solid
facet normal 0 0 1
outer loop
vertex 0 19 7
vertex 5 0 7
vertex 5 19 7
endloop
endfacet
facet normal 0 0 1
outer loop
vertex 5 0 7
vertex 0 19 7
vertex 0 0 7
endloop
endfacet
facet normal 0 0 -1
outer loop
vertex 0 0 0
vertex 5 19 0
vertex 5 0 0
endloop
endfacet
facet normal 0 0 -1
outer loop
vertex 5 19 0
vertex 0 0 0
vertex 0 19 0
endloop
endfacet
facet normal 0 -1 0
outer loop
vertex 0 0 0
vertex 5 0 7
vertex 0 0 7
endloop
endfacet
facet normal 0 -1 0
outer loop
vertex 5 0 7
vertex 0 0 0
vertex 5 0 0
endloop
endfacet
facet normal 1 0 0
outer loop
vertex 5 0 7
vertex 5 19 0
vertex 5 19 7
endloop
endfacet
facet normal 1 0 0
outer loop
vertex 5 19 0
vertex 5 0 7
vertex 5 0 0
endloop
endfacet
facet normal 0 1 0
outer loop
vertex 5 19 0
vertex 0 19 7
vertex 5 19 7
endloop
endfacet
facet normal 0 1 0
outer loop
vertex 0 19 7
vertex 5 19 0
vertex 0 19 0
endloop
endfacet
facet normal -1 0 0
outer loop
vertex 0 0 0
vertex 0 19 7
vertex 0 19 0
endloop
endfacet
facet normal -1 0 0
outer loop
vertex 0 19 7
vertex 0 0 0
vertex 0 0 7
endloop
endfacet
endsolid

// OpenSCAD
// Generated by SolidPython 1.0.1 on 2020-07-29 00:46:54


cube(size = [5, 19, 7]);
/***********************************************
*********      SolidPython code:      **********
************************************************
 
# import packages: SolidPython
from solid import *
from solid.utils import *
from itertools import chain, combinations, permutations


class Resize:

    def __init__(self, scad_file):
        self.scad_file = scad_file
        #self.scad_file = import_scad(scad_file)
        # cone/cylinder param:
        self.r1 = 0
        self.r2 = 0
        self.h = 0
        # rectangular prism param:
        self.w = 0
        self.l = 0
        # ellipse param:
        self.r = 0

    # import OpenScad code (file name corresponds to shape)


    # classify shape + parameters
    def assign(self, param1, param2, param3):
        if self.scad_file == 'cone.scad':
            self.r1 = param1
            self.r2 = param2
            self.h = param3
        elif self.scad_file == 'cylinder.scad':
            self.r1 = param1
            self.r2 = param2
            self.h = param3
        elif self.scad_file == 'rectangularPrism.scad':
            self.h = param1
            self.l = param2
            self.w = param3
        else:
            self.r = param1
            self.h = param2

    # resize parameters
    def iterate(self):
        x = range(3, 20, 2)
        i = 1
        if self.scad_file == 'cone.scad':
            tempList = list(permutations(x, 2))
            for temp in tempList:
                param1 = temp[0]
                param2 = temp[1]
                filepath = 'produced_scad_files/' + 'cone' + str(param1) + '_' + str(param2) + '_' + '.scad'
                scad_render_to_file(cylinder(h=param1, r1=param2, r2=0), filepath)

        elif self.scad_file == 'cylinder.scad':
            tempList = list(permutations(x, 3))
            for temp in tempList:
                param1 = temp[0]
                param2 = temp[1]
                filepath = 'produced_scad_files/' + 'cylinder' + str(param1) + '_' + str(param2) + '_' + '.scad'
                scad_render_to_file(cylinder(h=param1, r1=param2, r2=param2), filepath)

        elif self.scad_file == 'rectangularPrism.scad':
            tempList = list(permutations(x, 3))
            for temp in tempList:
                param1 = temp[0]
                param2 = temp[1]
                param3 = temp[2]
                filepath = 'produced_scad_files/' + 'rectangularPrism' + str(param1) + '_' + str(param2) + '_' + str(
                    param3) + '.scad'
                scad_render_to_file(cube(size=(param1, param2, param3)), filepath)

        elif self.scad_file == 'ellipse.scad':
            tempList = list(permutations(x, 4))
            for temp in tempList:
                param1 = temp[0]
                param2 = temp[1]
                param3 = temp[2]
                param4 = temp[3]
                filepath = 'produced_scad_files/' + 'ellipse' + str(param1) + '_' + str(param2) + '_' + str(param3) + '_' + str(param4) + '.scad'
                scad_render_to_file(scale([param1, param2, param3])(sphere(r=param4)), filepath)

    def render_to_scadfile(self):
        scad_render_to_file(scad, 'example.scad') 
 
************************************************/
